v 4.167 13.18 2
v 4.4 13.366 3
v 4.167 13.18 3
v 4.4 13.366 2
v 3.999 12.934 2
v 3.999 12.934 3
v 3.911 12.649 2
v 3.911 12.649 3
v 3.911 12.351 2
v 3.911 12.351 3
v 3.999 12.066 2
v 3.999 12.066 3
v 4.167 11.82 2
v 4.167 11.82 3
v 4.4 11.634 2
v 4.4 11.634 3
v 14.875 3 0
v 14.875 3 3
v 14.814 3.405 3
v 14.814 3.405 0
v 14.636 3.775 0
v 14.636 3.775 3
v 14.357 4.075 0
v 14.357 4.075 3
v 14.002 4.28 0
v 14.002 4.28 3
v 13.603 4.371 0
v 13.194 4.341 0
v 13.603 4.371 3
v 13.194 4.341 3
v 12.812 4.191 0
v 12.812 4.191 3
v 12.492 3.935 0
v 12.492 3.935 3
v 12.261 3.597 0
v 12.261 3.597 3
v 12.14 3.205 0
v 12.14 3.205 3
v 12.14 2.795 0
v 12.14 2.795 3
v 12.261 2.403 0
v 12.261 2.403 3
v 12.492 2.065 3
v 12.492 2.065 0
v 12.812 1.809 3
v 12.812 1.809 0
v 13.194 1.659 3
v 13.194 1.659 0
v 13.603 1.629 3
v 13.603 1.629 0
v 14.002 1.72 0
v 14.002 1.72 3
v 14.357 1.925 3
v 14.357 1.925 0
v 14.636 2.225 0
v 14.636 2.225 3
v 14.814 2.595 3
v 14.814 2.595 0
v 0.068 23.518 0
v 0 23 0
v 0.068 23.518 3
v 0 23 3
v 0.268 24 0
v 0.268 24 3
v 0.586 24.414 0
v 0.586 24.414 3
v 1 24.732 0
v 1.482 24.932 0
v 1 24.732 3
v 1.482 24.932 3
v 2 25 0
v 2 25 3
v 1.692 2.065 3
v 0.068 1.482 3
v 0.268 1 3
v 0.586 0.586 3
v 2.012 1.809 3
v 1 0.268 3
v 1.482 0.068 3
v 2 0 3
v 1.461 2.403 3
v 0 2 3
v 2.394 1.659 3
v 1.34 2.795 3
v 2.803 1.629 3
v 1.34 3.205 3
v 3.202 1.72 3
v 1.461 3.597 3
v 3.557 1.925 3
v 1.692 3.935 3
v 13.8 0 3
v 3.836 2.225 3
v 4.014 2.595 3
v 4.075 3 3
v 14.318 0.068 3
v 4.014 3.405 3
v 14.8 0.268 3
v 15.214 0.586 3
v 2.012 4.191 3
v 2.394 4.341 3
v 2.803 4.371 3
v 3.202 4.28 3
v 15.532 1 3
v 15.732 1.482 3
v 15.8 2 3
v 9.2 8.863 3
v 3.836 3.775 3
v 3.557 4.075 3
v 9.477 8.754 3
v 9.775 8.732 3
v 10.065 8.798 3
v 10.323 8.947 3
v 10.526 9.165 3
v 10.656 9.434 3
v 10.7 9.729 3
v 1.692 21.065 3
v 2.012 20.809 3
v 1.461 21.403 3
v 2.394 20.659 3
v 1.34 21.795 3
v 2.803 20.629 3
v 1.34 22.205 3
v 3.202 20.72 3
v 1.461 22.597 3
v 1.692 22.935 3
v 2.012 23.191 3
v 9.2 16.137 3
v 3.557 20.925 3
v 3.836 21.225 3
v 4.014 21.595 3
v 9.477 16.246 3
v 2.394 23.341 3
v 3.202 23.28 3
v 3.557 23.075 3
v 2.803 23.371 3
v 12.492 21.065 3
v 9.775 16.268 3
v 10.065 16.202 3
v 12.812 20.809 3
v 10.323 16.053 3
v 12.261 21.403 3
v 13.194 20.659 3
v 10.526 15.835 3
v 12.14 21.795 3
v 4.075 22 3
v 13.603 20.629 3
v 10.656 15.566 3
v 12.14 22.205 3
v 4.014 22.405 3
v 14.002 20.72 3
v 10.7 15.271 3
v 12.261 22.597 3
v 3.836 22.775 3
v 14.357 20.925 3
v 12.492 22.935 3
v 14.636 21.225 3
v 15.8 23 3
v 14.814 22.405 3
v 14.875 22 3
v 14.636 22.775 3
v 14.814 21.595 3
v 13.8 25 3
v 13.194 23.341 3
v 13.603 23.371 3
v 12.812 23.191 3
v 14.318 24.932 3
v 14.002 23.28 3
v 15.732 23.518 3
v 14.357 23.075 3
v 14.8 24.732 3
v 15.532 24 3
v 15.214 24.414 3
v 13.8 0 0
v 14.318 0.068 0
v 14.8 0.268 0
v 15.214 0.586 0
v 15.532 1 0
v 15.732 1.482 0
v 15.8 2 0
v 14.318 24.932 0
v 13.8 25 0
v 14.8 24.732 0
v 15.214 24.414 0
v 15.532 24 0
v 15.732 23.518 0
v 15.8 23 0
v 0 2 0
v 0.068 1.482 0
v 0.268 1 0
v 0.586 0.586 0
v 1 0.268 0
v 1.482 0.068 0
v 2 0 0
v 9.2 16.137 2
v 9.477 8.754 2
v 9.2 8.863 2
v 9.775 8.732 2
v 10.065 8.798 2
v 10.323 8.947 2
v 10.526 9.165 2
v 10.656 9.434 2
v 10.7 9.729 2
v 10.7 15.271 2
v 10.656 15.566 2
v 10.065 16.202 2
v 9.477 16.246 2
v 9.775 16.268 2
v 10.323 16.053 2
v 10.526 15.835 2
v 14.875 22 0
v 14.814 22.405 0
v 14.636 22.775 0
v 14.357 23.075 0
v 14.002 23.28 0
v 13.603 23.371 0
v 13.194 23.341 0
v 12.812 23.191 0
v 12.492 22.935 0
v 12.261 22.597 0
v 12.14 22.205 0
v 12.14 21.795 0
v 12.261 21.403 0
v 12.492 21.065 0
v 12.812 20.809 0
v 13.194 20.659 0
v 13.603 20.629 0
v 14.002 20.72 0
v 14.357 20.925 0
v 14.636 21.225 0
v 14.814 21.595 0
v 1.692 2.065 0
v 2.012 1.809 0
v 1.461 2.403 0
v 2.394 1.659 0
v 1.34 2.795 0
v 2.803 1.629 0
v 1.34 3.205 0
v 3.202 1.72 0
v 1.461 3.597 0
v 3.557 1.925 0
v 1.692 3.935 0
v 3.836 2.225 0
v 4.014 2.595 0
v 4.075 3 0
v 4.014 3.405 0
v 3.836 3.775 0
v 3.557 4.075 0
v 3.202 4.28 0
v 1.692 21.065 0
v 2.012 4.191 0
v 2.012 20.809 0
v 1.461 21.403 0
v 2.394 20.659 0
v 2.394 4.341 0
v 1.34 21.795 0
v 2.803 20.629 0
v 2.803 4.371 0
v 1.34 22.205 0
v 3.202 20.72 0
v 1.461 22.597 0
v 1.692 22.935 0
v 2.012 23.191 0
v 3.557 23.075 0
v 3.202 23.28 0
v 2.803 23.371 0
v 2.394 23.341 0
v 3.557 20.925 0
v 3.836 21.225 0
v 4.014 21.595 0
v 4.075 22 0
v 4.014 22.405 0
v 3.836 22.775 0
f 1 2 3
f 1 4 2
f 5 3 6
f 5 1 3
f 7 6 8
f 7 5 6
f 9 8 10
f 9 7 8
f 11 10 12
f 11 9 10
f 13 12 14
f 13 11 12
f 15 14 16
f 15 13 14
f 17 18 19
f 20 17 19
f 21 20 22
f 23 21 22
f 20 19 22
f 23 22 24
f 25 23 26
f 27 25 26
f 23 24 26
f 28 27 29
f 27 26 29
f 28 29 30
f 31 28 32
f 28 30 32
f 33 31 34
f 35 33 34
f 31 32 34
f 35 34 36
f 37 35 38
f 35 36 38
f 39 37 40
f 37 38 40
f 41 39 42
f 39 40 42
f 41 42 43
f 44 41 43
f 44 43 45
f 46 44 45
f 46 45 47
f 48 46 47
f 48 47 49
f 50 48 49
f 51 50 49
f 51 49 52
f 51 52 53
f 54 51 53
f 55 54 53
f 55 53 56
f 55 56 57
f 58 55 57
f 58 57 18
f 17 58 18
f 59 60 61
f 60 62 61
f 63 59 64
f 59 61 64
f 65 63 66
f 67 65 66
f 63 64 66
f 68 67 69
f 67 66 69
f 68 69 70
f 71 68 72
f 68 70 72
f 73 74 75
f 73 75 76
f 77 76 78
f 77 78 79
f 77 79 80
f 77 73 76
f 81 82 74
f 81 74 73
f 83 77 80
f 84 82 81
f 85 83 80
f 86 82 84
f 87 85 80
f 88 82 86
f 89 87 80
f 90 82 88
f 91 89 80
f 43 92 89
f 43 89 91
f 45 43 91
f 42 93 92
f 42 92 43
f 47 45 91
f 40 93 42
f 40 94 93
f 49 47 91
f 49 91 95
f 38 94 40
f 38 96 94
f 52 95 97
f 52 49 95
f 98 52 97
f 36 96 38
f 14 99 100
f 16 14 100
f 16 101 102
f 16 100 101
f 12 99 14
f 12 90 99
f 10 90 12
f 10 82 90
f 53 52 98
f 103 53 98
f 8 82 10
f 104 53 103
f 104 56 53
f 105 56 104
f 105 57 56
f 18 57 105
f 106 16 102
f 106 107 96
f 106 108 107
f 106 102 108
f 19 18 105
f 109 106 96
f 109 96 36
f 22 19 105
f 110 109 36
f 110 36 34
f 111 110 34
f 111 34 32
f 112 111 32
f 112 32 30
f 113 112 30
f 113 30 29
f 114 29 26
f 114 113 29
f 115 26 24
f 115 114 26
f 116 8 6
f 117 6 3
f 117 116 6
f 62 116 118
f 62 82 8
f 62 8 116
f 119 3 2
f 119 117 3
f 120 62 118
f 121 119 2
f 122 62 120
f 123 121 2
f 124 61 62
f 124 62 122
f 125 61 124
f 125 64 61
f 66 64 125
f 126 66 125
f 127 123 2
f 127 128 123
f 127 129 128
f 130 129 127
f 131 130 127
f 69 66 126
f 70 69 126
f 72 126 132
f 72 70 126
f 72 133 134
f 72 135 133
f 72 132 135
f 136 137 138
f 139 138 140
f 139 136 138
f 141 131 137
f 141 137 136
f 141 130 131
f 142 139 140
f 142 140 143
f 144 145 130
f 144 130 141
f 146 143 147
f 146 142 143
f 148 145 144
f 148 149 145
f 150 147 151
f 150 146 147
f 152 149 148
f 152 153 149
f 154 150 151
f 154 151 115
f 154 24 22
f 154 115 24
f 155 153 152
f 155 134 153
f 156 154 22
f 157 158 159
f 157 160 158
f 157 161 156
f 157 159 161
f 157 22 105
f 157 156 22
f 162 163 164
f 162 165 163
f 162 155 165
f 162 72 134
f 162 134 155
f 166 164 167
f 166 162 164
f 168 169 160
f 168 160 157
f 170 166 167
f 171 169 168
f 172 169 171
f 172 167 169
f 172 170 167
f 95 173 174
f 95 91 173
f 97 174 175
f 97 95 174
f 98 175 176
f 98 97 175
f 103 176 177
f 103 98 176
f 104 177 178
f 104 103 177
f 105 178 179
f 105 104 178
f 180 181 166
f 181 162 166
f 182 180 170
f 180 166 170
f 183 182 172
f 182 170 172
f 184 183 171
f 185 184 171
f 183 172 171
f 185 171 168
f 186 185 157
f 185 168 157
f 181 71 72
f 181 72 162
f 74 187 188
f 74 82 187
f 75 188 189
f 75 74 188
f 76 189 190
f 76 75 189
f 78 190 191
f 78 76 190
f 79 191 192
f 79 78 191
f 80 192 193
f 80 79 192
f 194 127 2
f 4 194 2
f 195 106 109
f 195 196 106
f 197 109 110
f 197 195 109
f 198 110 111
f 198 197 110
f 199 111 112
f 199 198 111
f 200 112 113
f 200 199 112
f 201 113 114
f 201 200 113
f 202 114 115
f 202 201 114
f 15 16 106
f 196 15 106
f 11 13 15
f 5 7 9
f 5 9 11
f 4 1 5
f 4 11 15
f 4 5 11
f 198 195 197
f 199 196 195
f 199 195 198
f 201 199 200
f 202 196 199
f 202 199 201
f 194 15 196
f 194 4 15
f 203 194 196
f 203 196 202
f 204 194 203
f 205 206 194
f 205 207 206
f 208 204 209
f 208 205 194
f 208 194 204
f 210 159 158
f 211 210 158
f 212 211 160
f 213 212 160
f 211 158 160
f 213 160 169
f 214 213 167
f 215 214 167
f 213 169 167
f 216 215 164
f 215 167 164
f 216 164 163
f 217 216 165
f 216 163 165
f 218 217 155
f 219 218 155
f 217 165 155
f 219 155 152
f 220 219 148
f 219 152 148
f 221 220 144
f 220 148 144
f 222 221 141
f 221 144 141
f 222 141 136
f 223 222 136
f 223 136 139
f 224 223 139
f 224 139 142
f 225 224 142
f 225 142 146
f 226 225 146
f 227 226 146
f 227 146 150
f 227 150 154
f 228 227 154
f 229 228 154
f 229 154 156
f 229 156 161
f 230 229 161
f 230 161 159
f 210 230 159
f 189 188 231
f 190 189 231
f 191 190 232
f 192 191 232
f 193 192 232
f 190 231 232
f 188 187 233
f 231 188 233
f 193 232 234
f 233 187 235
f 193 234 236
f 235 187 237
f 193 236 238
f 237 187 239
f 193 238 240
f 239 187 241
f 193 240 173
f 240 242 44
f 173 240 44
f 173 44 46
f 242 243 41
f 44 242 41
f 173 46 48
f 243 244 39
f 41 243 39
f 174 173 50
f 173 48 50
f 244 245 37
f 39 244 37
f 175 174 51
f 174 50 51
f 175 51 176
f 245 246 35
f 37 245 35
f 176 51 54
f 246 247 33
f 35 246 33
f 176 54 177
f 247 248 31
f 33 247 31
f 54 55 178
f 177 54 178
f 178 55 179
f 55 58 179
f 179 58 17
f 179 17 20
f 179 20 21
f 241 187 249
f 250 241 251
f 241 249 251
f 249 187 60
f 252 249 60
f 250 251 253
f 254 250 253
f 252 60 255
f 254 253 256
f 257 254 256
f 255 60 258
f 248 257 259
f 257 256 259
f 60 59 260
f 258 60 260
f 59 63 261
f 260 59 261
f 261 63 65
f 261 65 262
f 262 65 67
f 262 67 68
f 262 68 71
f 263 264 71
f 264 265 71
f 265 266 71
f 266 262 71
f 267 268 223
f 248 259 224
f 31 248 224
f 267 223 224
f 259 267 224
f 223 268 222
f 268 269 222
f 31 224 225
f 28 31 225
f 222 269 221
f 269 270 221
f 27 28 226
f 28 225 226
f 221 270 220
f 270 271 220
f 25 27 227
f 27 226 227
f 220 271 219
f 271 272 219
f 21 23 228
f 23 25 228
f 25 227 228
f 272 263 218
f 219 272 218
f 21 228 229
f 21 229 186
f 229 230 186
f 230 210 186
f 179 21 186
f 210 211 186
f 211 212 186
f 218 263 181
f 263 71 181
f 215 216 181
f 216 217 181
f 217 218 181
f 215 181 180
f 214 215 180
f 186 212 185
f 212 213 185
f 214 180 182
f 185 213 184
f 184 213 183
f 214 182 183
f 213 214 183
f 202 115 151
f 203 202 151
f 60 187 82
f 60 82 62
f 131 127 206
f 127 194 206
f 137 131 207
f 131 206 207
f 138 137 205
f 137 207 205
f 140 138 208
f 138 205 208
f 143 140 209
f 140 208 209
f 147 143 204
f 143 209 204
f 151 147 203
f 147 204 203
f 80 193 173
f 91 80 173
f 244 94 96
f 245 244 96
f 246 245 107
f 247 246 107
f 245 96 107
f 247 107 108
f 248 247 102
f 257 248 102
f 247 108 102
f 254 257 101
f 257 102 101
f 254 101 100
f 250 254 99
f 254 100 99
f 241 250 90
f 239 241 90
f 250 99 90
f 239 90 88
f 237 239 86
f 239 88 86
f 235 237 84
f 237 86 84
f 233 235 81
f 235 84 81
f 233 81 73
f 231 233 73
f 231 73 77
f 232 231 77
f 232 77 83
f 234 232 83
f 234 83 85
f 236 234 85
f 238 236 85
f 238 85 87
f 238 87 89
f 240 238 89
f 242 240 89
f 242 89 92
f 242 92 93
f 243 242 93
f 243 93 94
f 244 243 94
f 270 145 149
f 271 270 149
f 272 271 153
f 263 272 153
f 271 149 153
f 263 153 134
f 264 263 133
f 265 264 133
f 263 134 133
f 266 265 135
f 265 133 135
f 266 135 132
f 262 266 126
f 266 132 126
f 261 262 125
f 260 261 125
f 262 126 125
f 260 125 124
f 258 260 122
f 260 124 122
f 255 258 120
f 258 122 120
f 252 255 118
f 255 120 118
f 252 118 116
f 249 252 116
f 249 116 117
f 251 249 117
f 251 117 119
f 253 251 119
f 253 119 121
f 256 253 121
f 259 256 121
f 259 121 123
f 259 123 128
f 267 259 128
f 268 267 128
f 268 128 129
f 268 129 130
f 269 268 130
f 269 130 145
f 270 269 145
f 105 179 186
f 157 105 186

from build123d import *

# Parameters (mm, degrees)
F0_W      = 15.8
F0_H      = 25
F1_DEPTH  = 3
F3_R      = 1.375
F4_R      = 1.375
F7_DEPTH  = 5
F5_R      = 1.375
F8_DEPTH  = 5
F6_R      = 1.375
F9_DEPTH  = 5
F10_R     = 2
F12_DEPTH = 1
F13_R     = 1


with BuildPart() as f1:
    # F0 (on Top) → F1 (new body)
    with BuildSketch(Plane.XY):
        with Locations((7.9, 12.5)):
            Rectangle(F0_W, F0_H)
    extrude(amount=F1_DEPTH)

    # F3 (on face) + F4 (on face) → F7 (cut)
    with BuildSketch(Plane.XY.offset(3)):
        with Locations((13.5, 3)):
            Circle(F3_R)
    with BuildSketch(Plane.XY.offset(3)):
        with Locations((2.7, 3)):
            Circle(F4_R)
    extrude(amount=-F7_DEPTH, mode=Mode.SUBTRACT)

    # F5 (on face) → F8 (cut)
    with BuildSketch(Plane.XY.offset(3)):
        with Locations((2.7, 22)):
            Circle(F5_R)
    extrude(amount=-F8_DEPTH, mode=Mode.SUBTRACT)

    # F6 (on face) → F9 (cut)
    with BuildSketch(Plane.XY.offset(3)):
        with Locations((13.5, 22)):
            Circle(F6_R)
    extrude(amount=-F9_DEPTH, mode=Mode.SUBTRACT)

    # F10
    f10_edges = [f1.edges().sort_by_distance(p)[0] for p in [
        (15.8, 25, 1.5),
        (15.8, 0, 1.5),
        (0, 0, 1.5),
        (0, 25, 1.5),
    ]]
    fillet(f10_edges, radius=F10_R)

    # F11 (on face) → F12 (cut)
    with BuildSketch(Plane.XY.offset(3)):
        Polygon((10.7, 17.003332), (2.9, 12.5), (10.7, 7.996668), align=None)
    extrude(amount=-F12_DEPTH, mode=Mode.SUBTRACT)

    # F13
    f13_edges = [f1.edges().sort_by_distance(p)[0] for p in [
        (2.9, 12.5, 2.5),
        (10.7, 17.003332, 2.5),
        (10.7, 7.996668, 2.5),
    ]]
    fillet(f13_edges, radius=F13_R)


solid = f1.part
